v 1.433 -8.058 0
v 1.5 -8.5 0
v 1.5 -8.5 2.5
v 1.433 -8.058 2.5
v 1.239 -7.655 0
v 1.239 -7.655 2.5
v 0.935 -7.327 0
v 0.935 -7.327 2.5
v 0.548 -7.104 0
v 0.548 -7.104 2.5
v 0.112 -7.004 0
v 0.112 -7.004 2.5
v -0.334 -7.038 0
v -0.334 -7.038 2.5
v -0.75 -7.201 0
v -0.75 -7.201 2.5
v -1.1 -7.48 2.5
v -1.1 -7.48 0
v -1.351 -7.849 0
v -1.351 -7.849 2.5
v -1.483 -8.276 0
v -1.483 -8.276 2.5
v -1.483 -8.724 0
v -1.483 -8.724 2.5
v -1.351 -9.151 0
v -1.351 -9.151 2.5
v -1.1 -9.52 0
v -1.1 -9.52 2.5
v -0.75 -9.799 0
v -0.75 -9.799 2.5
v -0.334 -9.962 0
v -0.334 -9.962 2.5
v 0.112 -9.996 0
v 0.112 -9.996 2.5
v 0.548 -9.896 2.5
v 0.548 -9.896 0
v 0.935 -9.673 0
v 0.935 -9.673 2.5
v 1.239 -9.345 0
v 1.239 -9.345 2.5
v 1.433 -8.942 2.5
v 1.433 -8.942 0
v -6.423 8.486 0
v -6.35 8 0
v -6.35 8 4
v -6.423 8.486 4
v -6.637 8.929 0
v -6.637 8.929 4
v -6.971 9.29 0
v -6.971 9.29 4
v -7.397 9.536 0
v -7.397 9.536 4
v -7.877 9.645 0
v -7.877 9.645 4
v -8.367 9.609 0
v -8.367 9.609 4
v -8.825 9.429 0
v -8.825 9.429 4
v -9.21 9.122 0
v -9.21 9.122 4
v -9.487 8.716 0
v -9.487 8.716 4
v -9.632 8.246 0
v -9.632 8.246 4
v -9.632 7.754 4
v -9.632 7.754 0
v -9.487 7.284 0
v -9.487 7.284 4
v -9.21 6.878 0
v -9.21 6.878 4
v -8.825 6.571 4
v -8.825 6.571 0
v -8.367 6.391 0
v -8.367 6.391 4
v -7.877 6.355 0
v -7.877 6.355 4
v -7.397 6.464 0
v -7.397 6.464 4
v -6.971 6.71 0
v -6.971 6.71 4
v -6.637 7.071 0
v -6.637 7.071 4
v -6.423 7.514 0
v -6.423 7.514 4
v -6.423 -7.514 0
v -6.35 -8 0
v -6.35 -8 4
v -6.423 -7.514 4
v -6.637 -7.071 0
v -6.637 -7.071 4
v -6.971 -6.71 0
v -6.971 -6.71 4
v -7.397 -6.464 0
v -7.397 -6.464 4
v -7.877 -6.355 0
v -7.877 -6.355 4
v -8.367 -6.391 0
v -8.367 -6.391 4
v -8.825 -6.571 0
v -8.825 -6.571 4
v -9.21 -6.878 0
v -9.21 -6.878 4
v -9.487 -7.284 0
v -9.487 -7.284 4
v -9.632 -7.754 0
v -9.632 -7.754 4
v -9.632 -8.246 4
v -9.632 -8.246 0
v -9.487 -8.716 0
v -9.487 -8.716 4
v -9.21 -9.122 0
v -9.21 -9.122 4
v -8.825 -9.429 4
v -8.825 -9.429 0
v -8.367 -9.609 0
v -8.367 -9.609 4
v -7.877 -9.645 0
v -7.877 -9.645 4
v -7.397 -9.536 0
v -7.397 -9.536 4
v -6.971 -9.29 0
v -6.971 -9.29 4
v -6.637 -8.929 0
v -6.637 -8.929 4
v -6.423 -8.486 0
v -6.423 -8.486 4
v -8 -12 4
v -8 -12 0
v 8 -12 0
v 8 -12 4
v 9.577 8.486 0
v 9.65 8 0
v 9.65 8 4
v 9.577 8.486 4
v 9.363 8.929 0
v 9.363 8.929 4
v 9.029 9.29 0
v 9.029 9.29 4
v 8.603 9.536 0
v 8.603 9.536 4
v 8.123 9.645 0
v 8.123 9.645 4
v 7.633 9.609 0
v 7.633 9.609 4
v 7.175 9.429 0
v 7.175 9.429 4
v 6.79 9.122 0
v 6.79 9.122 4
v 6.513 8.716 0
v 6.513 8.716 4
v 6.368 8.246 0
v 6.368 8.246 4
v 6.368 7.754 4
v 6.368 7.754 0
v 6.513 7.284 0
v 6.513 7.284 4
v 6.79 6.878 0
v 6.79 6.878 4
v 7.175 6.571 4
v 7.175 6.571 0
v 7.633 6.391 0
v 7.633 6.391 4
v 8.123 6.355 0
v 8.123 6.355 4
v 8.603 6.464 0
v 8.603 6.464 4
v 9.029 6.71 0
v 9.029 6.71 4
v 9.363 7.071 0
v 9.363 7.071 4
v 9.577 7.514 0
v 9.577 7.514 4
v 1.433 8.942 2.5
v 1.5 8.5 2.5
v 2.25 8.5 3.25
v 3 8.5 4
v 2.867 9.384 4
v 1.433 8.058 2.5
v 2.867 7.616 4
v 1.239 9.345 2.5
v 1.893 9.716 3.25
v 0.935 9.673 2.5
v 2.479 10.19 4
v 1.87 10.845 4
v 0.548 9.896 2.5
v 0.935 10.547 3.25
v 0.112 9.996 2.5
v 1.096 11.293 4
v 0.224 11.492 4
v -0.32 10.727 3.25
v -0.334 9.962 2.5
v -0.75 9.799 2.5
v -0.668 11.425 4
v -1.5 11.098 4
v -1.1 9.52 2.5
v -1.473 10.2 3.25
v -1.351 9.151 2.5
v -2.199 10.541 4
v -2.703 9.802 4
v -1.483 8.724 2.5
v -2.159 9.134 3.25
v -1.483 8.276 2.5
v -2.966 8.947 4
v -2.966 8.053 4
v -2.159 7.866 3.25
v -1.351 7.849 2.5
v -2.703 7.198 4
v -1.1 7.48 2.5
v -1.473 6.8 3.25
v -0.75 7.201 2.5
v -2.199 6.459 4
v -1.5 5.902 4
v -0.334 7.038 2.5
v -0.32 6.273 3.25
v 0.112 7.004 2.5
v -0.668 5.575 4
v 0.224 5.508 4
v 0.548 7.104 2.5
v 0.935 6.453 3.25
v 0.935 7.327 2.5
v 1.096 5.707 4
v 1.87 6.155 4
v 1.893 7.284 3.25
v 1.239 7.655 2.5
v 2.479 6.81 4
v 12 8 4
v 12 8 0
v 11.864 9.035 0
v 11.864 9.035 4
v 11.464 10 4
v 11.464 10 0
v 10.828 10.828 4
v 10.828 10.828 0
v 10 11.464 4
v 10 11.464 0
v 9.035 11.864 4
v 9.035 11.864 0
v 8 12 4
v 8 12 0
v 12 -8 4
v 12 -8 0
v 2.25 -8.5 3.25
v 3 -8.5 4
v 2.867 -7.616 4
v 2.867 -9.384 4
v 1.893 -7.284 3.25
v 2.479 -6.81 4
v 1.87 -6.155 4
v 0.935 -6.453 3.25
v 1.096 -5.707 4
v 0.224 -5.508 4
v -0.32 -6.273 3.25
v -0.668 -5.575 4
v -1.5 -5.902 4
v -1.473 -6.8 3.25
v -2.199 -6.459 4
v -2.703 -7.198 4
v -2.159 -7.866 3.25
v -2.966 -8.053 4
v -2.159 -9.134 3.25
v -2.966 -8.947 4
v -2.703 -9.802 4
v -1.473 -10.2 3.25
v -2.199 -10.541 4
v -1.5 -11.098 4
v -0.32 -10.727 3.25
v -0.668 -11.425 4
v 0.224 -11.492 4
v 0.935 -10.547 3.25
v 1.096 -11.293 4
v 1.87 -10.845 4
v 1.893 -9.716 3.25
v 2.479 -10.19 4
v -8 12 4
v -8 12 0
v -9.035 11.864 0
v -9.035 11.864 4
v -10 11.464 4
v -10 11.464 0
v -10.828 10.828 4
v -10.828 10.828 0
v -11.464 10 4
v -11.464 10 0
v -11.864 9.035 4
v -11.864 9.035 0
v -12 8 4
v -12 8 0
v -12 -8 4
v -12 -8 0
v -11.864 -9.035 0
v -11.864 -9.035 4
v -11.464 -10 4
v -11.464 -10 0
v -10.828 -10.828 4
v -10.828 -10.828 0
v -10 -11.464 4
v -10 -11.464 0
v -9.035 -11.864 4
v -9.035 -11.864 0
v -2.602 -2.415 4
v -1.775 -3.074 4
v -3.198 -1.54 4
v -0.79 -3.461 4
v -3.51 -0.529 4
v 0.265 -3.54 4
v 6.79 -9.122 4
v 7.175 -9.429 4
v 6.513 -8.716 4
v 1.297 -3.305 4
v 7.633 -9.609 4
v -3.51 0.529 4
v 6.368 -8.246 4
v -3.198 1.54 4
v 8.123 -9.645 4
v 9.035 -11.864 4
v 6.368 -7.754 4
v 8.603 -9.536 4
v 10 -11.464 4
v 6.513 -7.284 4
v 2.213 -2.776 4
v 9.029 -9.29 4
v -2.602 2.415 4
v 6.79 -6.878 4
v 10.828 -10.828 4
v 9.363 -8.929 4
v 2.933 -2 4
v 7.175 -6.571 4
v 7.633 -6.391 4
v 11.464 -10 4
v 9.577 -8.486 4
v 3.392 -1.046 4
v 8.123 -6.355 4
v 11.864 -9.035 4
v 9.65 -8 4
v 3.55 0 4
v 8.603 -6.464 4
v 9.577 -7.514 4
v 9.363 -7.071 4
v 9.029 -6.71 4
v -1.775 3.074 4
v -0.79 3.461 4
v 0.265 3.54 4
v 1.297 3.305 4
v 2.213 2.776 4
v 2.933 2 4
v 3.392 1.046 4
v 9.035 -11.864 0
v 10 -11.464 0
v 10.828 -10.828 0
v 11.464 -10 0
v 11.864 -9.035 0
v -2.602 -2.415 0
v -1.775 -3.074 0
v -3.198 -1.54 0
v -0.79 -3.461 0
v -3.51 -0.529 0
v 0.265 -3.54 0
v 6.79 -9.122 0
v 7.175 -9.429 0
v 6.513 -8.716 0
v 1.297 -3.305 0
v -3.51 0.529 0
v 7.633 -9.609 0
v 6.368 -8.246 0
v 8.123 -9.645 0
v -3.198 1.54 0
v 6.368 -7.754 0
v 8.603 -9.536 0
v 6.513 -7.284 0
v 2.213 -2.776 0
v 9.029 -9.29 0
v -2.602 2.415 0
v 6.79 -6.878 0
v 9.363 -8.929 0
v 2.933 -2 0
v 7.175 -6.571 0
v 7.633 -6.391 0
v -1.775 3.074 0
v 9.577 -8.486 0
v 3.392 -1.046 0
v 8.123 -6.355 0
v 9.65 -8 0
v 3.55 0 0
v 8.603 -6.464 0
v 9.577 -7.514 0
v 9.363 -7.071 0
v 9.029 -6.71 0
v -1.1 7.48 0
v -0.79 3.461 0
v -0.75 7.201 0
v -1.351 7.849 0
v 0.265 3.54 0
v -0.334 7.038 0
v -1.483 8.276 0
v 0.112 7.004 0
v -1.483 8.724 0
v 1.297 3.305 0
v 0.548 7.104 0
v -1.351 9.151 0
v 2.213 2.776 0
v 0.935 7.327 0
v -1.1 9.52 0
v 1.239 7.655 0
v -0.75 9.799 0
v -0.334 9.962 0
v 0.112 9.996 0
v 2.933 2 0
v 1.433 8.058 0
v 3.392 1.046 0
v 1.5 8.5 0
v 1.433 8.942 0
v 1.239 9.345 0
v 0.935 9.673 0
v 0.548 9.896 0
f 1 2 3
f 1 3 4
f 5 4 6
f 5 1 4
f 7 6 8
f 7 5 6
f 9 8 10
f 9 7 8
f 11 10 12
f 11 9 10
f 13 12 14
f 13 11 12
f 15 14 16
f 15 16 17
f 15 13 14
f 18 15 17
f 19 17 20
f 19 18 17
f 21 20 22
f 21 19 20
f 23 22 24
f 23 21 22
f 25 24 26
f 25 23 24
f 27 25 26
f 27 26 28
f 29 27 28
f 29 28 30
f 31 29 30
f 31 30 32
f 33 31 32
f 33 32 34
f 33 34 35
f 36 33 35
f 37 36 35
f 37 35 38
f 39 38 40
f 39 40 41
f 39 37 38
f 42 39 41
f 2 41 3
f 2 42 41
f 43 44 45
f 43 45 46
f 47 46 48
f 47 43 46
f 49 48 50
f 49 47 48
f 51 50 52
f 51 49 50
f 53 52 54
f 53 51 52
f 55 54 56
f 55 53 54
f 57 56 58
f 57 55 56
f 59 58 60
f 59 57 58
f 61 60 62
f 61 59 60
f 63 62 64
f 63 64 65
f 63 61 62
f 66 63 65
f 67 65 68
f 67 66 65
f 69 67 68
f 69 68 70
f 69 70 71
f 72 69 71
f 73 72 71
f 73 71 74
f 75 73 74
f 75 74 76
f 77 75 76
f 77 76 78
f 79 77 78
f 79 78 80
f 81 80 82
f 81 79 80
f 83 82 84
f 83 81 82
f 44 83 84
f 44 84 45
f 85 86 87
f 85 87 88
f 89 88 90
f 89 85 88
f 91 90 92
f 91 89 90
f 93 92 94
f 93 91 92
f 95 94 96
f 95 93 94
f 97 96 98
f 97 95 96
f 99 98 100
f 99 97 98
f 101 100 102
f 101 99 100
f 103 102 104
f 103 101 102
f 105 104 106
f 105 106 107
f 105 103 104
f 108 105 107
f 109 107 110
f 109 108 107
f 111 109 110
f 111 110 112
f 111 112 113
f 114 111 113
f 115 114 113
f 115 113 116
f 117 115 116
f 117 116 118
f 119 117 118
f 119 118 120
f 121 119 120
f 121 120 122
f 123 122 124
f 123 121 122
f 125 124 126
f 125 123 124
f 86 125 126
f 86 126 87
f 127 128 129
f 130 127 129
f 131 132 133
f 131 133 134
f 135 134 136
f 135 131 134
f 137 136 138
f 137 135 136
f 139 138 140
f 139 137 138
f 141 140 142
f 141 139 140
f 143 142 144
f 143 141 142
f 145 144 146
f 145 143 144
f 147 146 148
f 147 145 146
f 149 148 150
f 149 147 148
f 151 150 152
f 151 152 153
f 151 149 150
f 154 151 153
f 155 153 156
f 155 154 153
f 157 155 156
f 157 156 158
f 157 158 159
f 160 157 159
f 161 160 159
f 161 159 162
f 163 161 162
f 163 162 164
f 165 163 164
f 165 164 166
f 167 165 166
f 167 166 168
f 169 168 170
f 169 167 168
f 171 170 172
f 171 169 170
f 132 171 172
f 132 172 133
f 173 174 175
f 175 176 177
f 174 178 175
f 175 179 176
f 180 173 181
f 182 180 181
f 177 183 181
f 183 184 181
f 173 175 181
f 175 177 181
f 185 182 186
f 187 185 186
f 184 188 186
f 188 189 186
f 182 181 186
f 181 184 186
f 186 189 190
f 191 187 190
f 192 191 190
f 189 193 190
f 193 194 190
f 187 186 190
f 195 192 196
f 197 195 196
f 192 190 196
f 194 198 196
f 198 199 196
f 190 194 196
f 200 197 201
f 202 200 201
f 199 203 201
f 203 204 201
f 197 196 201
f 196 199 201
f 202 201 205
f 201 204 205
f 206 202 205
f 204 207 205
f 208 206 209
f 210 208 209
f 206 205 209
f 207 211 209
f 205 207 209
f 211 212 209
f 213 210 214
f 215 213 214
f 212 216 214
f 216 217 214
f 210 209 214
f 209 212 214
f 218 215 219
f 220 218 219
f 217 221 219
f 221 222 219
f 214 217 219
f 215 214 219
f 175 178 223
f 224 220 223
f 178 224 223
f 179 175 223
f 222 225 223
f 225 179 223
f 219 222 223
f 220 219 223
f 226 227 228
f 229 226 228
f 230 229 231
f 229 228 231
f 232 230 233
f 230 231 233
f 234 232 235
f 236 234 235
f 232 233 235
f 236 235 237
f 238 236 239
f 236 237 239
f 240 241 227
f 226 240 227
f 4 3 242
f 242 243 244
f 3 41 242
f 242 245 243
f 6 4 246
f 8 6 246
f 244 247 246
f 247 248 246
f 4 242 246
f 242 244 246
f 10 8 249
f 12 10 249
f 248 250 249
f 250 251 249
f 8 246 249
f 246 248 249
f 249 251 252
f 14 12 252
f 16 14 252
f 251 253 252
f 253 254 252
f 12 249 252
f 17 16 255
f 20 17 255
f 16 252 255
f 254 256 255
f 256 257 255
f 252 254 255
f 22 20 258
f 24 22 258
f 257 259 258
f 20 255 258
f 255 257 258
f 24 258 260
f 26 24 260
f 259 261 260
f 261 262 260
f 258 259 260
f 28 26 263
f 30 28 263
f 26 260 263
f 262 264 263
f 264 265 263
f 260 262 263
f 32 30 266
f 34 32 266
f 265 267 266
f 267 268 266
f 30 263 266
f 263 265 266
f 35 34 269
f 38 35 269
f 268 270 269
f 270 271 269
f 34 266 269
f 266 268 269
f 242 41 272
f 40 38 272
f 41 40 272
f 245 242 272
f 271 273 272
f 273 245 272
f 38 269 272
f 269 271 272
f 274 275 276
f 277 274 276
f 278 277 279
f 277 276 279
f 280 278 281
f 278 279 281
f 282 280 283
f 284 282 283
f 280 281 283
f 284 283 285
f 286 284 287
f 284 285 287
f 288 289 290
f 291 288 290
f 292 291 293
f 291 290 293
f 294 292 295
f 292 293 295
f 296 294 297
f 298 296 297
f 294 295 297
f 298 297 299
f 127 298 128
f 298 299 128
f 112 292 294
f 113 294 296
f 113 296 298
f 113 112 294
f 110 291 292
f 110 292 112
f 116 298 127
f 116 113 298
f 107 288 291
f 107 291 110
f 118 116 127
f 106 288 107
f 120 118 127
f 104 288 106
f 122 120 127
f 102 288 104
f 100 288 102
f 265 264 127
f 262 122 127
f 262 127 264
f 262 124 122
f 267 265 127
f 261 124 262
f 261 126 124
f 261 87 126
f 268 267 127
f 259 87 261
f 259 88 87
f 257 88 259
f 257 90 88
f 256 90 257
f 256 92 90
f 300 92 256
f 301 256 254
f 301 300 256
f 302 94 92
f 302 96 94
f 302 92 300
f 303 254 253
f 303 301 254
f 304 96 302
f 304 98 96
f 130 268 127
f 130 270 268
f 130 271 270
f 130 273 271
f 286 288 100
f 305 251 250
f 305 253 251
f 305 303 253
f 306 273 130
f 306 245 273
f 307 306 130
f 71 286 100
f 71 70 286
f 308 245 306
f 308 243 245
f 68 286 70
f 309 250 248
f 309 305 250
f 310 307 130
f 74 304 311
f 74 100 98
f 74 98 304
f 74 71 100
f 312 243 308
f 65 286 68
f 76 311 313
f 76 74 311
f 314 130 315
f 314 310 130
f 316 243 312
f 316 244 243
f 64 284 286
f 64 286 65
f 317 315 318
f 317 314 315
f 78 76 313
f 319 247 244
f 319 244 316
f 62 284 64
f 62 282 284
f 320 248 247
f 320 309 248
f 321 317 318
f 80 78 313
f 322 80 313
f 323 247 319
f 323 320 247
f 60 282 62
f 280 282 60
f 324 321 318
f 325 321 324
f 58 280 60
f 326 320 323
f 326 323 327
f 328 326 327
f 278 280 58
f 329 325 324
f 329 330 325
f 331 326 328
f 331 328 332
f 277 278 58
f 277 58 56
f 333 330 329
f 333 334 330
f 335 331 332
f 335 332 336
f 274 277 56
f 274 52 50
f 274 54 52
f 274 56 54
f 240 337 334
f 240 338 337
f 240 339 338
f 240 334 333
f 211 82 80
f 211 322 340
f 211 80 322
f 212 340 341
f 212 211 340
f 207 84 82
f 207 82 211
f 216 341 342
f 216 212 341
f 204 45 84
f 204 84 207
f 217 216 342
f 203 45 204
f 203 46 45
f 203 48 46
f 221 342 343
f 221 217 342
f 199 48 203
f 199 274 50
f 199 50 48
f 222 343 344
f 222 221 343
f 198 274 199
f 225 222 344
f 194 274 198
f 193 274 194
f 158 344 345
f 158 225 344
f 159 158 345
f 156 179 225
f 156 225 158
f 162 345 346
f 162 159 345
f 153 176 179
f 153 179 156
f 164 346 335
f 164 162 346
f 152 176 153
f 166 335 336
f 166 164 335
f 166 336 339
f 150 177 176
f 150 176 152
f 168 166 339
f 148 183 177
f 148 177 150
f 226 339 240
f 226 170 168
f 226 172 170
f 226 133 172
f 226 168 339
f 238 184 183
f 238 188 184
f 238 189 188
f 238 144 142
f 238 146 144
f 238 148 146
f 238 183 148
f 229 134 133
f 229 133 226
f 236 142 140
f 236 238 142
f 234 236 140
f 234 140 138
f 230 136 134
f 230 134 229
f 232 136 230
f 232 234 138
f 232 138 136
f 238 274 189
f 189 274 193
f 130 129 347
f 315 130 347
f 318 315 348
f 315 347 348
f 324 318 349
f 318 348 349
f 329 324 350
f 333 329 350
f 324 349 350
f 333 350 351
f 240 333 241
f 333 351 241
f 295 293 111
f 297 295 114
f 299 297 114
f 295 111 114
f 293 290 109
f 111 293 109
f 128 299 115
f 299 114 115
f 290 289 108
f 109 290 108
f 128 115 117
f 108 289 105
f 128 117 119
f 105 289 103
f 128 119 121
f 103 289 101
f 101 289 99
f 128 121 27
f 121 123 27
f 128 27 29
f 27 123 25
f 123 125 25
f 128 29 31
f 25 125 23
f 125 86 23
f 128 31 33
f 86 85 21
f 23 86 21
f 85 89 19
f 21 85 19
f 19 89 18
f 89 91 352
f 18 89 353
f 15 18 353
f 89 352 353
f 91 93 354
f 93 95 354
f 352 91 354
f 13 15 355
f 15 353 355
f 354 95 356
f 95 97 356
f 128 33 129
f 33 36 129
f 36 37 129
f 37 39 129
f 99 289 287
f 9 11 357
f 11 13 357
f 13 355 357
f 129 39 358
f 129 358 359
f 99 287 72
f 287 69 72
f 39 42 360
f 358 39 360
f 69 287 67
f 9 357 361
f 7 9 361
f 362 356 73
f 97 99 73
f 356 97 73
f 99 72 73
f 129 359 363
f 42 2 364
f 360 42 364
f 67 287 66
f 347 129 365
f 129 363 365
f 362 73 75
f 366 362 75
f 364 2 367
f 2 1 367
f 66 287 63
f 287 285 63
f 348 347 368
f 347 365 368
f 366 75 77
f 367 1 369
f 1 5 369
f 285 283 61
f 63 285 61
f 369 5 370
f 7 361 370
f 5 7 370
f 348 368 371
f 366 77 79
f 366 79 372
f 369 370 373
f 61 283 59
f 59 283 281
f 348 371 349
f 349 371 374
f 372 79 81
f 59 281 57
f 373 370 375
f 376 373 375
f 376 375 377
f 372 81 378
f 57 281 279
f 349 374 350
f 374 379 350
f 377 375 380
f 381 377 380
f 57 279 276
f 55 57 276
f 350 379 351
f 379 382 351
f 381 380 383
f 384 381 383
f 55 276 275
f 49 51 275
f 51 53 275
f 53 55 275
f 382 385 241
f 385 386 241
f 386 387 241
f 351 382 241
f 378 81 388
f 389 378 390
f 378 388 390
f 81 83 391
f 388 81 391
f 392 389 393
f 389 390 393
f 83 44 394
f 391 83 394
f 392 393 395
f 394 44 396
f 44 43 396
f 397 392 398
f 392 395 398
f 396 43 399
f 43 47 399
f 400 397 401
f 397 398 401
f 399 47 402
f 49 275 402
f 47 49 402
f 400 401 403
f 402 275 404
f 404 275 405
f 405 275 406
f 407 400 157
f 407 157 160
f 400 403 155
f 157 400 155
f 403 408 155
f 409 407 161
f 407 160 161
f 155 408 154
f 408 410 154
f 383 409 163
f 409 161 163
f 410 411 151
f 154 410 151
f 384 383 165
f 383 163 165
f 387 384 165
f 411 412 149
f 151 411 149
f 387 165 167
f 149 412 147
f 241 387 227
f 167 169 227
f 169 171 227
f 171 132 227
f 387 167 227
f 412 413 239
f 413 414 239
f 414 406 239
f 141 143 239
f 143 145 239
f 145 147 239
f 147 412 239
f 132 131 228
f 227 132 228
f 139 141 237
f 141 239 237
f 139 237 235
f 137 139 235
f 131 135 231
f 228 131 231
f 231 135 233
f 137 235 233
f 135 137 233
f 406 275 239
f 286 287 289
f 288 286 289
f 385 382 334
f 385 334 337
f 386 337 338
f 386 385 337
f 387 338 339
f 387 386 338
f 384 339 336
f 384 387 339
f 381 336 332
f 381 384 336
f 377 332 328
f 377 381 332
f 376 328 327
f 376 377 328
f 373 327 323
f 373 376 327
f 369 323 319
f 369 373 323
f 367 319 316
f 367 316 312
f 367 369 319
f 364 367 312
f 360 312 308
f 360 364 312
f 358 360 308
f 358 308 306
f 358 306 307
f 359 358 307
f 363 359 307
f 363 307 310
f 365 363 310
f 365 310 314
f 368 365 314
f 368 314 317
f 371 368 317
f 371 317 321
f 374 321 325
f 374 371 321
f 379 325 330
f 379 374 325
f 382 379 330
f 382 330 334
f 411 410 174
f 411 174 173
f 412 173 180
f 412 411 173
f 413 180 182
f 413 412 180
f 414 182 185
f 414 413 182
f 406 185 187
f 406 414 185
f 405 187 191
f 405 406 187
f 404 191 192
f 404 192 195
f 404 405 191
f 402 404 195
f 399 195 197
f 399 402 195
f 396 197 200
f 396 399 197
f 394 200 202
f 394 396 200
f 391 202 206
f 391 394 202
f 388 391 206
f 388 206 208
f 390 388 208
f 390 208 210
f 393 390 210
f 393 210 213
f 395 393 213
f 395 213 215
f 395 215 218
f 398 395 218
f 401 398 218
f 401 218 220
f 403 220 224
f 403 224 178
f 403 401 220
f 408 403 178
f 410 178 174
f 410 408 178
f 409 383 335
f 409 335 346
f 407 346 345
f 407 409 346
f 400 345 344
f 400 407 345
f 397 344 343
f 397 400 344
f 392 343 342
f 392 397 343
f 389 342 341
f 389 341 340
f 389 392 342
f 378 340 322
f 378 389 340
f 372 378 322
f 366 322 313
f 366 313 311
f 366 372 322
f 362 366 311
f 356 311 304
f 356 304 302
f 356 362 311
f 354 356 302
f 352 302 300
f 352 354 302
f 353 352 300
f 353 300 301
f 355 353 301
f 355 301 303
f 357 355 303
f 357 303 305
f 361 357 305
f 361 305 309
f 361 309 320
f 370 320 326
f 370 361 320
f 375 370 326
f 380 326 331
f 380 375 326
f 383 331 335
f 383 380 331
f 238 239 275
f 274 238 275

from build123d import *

# Parameters (mm, degrees)
F0_R     = 1.65
F0_R_2   = 1.5
F0_R_3   = 3.55
F1_DEPTH = 4
F2_SIZE2 = 1.5
F2_SIZE  = 1.5


with BuildPart() as f1:
    # F0 (on Top) → F1 (new body)
    with BuildSketch(Plane.XY):
        with BuildLine():
            ThreePointArc((12, 8), (10.828427, 10.828427), (8, 12))
            Line((8, 12), (-8, 12))
            ThreePointArc((-8, 12), (-10.828427, 10.828427), (-12, 8))
            Line((-12, 8), (-12, -8))
            ThreePointArc((-12, -8), (-10.828427, -10.828427), (-8, -12))
            Line((-8, -12), (8, -12))
            ThreePointArc((8, -12), (10.828427, -10.828427), (12, -8))
            Line((12, -8), (12, 8))
        make_face()
        with Locations((-8, -8)):
            Circle(F0_R, mode=Mode.SUBTRACT)
        with Locations((0, -8.5)):
            Circle(F0_R_2, mode=Mode.SUBTRACT)
        with Locations((8, -8)):
            Circle(F0_R, mode=Mode.SUBTRACT)
        with Locations((-8, 8)):
            Circle(F0_R, mode=Mode.SUBTRACT)
        Circle(F0_R_3, mode=Mode.SUBTRACT)
        with Locations((0, 8.5)):
            Circle(F0_R_2, mode=Mode.SUBTRACT)
        with Locations((8, 8)):
            Circle(F0_R, mode=Mode.SUBTRACT)
    extrude(amount=F1_DEPTH)

    # F2
    f2_edges = [f1.edges().sort_by_distance(p)[0] for p in [
        (-1.5, 8.5, 4),
        (-1.5, -8.5, 4),
    ]]
    chamfer(f2_edges, length=F2_SIZE, length2=F2_SIZE2)


solid = f1.part
